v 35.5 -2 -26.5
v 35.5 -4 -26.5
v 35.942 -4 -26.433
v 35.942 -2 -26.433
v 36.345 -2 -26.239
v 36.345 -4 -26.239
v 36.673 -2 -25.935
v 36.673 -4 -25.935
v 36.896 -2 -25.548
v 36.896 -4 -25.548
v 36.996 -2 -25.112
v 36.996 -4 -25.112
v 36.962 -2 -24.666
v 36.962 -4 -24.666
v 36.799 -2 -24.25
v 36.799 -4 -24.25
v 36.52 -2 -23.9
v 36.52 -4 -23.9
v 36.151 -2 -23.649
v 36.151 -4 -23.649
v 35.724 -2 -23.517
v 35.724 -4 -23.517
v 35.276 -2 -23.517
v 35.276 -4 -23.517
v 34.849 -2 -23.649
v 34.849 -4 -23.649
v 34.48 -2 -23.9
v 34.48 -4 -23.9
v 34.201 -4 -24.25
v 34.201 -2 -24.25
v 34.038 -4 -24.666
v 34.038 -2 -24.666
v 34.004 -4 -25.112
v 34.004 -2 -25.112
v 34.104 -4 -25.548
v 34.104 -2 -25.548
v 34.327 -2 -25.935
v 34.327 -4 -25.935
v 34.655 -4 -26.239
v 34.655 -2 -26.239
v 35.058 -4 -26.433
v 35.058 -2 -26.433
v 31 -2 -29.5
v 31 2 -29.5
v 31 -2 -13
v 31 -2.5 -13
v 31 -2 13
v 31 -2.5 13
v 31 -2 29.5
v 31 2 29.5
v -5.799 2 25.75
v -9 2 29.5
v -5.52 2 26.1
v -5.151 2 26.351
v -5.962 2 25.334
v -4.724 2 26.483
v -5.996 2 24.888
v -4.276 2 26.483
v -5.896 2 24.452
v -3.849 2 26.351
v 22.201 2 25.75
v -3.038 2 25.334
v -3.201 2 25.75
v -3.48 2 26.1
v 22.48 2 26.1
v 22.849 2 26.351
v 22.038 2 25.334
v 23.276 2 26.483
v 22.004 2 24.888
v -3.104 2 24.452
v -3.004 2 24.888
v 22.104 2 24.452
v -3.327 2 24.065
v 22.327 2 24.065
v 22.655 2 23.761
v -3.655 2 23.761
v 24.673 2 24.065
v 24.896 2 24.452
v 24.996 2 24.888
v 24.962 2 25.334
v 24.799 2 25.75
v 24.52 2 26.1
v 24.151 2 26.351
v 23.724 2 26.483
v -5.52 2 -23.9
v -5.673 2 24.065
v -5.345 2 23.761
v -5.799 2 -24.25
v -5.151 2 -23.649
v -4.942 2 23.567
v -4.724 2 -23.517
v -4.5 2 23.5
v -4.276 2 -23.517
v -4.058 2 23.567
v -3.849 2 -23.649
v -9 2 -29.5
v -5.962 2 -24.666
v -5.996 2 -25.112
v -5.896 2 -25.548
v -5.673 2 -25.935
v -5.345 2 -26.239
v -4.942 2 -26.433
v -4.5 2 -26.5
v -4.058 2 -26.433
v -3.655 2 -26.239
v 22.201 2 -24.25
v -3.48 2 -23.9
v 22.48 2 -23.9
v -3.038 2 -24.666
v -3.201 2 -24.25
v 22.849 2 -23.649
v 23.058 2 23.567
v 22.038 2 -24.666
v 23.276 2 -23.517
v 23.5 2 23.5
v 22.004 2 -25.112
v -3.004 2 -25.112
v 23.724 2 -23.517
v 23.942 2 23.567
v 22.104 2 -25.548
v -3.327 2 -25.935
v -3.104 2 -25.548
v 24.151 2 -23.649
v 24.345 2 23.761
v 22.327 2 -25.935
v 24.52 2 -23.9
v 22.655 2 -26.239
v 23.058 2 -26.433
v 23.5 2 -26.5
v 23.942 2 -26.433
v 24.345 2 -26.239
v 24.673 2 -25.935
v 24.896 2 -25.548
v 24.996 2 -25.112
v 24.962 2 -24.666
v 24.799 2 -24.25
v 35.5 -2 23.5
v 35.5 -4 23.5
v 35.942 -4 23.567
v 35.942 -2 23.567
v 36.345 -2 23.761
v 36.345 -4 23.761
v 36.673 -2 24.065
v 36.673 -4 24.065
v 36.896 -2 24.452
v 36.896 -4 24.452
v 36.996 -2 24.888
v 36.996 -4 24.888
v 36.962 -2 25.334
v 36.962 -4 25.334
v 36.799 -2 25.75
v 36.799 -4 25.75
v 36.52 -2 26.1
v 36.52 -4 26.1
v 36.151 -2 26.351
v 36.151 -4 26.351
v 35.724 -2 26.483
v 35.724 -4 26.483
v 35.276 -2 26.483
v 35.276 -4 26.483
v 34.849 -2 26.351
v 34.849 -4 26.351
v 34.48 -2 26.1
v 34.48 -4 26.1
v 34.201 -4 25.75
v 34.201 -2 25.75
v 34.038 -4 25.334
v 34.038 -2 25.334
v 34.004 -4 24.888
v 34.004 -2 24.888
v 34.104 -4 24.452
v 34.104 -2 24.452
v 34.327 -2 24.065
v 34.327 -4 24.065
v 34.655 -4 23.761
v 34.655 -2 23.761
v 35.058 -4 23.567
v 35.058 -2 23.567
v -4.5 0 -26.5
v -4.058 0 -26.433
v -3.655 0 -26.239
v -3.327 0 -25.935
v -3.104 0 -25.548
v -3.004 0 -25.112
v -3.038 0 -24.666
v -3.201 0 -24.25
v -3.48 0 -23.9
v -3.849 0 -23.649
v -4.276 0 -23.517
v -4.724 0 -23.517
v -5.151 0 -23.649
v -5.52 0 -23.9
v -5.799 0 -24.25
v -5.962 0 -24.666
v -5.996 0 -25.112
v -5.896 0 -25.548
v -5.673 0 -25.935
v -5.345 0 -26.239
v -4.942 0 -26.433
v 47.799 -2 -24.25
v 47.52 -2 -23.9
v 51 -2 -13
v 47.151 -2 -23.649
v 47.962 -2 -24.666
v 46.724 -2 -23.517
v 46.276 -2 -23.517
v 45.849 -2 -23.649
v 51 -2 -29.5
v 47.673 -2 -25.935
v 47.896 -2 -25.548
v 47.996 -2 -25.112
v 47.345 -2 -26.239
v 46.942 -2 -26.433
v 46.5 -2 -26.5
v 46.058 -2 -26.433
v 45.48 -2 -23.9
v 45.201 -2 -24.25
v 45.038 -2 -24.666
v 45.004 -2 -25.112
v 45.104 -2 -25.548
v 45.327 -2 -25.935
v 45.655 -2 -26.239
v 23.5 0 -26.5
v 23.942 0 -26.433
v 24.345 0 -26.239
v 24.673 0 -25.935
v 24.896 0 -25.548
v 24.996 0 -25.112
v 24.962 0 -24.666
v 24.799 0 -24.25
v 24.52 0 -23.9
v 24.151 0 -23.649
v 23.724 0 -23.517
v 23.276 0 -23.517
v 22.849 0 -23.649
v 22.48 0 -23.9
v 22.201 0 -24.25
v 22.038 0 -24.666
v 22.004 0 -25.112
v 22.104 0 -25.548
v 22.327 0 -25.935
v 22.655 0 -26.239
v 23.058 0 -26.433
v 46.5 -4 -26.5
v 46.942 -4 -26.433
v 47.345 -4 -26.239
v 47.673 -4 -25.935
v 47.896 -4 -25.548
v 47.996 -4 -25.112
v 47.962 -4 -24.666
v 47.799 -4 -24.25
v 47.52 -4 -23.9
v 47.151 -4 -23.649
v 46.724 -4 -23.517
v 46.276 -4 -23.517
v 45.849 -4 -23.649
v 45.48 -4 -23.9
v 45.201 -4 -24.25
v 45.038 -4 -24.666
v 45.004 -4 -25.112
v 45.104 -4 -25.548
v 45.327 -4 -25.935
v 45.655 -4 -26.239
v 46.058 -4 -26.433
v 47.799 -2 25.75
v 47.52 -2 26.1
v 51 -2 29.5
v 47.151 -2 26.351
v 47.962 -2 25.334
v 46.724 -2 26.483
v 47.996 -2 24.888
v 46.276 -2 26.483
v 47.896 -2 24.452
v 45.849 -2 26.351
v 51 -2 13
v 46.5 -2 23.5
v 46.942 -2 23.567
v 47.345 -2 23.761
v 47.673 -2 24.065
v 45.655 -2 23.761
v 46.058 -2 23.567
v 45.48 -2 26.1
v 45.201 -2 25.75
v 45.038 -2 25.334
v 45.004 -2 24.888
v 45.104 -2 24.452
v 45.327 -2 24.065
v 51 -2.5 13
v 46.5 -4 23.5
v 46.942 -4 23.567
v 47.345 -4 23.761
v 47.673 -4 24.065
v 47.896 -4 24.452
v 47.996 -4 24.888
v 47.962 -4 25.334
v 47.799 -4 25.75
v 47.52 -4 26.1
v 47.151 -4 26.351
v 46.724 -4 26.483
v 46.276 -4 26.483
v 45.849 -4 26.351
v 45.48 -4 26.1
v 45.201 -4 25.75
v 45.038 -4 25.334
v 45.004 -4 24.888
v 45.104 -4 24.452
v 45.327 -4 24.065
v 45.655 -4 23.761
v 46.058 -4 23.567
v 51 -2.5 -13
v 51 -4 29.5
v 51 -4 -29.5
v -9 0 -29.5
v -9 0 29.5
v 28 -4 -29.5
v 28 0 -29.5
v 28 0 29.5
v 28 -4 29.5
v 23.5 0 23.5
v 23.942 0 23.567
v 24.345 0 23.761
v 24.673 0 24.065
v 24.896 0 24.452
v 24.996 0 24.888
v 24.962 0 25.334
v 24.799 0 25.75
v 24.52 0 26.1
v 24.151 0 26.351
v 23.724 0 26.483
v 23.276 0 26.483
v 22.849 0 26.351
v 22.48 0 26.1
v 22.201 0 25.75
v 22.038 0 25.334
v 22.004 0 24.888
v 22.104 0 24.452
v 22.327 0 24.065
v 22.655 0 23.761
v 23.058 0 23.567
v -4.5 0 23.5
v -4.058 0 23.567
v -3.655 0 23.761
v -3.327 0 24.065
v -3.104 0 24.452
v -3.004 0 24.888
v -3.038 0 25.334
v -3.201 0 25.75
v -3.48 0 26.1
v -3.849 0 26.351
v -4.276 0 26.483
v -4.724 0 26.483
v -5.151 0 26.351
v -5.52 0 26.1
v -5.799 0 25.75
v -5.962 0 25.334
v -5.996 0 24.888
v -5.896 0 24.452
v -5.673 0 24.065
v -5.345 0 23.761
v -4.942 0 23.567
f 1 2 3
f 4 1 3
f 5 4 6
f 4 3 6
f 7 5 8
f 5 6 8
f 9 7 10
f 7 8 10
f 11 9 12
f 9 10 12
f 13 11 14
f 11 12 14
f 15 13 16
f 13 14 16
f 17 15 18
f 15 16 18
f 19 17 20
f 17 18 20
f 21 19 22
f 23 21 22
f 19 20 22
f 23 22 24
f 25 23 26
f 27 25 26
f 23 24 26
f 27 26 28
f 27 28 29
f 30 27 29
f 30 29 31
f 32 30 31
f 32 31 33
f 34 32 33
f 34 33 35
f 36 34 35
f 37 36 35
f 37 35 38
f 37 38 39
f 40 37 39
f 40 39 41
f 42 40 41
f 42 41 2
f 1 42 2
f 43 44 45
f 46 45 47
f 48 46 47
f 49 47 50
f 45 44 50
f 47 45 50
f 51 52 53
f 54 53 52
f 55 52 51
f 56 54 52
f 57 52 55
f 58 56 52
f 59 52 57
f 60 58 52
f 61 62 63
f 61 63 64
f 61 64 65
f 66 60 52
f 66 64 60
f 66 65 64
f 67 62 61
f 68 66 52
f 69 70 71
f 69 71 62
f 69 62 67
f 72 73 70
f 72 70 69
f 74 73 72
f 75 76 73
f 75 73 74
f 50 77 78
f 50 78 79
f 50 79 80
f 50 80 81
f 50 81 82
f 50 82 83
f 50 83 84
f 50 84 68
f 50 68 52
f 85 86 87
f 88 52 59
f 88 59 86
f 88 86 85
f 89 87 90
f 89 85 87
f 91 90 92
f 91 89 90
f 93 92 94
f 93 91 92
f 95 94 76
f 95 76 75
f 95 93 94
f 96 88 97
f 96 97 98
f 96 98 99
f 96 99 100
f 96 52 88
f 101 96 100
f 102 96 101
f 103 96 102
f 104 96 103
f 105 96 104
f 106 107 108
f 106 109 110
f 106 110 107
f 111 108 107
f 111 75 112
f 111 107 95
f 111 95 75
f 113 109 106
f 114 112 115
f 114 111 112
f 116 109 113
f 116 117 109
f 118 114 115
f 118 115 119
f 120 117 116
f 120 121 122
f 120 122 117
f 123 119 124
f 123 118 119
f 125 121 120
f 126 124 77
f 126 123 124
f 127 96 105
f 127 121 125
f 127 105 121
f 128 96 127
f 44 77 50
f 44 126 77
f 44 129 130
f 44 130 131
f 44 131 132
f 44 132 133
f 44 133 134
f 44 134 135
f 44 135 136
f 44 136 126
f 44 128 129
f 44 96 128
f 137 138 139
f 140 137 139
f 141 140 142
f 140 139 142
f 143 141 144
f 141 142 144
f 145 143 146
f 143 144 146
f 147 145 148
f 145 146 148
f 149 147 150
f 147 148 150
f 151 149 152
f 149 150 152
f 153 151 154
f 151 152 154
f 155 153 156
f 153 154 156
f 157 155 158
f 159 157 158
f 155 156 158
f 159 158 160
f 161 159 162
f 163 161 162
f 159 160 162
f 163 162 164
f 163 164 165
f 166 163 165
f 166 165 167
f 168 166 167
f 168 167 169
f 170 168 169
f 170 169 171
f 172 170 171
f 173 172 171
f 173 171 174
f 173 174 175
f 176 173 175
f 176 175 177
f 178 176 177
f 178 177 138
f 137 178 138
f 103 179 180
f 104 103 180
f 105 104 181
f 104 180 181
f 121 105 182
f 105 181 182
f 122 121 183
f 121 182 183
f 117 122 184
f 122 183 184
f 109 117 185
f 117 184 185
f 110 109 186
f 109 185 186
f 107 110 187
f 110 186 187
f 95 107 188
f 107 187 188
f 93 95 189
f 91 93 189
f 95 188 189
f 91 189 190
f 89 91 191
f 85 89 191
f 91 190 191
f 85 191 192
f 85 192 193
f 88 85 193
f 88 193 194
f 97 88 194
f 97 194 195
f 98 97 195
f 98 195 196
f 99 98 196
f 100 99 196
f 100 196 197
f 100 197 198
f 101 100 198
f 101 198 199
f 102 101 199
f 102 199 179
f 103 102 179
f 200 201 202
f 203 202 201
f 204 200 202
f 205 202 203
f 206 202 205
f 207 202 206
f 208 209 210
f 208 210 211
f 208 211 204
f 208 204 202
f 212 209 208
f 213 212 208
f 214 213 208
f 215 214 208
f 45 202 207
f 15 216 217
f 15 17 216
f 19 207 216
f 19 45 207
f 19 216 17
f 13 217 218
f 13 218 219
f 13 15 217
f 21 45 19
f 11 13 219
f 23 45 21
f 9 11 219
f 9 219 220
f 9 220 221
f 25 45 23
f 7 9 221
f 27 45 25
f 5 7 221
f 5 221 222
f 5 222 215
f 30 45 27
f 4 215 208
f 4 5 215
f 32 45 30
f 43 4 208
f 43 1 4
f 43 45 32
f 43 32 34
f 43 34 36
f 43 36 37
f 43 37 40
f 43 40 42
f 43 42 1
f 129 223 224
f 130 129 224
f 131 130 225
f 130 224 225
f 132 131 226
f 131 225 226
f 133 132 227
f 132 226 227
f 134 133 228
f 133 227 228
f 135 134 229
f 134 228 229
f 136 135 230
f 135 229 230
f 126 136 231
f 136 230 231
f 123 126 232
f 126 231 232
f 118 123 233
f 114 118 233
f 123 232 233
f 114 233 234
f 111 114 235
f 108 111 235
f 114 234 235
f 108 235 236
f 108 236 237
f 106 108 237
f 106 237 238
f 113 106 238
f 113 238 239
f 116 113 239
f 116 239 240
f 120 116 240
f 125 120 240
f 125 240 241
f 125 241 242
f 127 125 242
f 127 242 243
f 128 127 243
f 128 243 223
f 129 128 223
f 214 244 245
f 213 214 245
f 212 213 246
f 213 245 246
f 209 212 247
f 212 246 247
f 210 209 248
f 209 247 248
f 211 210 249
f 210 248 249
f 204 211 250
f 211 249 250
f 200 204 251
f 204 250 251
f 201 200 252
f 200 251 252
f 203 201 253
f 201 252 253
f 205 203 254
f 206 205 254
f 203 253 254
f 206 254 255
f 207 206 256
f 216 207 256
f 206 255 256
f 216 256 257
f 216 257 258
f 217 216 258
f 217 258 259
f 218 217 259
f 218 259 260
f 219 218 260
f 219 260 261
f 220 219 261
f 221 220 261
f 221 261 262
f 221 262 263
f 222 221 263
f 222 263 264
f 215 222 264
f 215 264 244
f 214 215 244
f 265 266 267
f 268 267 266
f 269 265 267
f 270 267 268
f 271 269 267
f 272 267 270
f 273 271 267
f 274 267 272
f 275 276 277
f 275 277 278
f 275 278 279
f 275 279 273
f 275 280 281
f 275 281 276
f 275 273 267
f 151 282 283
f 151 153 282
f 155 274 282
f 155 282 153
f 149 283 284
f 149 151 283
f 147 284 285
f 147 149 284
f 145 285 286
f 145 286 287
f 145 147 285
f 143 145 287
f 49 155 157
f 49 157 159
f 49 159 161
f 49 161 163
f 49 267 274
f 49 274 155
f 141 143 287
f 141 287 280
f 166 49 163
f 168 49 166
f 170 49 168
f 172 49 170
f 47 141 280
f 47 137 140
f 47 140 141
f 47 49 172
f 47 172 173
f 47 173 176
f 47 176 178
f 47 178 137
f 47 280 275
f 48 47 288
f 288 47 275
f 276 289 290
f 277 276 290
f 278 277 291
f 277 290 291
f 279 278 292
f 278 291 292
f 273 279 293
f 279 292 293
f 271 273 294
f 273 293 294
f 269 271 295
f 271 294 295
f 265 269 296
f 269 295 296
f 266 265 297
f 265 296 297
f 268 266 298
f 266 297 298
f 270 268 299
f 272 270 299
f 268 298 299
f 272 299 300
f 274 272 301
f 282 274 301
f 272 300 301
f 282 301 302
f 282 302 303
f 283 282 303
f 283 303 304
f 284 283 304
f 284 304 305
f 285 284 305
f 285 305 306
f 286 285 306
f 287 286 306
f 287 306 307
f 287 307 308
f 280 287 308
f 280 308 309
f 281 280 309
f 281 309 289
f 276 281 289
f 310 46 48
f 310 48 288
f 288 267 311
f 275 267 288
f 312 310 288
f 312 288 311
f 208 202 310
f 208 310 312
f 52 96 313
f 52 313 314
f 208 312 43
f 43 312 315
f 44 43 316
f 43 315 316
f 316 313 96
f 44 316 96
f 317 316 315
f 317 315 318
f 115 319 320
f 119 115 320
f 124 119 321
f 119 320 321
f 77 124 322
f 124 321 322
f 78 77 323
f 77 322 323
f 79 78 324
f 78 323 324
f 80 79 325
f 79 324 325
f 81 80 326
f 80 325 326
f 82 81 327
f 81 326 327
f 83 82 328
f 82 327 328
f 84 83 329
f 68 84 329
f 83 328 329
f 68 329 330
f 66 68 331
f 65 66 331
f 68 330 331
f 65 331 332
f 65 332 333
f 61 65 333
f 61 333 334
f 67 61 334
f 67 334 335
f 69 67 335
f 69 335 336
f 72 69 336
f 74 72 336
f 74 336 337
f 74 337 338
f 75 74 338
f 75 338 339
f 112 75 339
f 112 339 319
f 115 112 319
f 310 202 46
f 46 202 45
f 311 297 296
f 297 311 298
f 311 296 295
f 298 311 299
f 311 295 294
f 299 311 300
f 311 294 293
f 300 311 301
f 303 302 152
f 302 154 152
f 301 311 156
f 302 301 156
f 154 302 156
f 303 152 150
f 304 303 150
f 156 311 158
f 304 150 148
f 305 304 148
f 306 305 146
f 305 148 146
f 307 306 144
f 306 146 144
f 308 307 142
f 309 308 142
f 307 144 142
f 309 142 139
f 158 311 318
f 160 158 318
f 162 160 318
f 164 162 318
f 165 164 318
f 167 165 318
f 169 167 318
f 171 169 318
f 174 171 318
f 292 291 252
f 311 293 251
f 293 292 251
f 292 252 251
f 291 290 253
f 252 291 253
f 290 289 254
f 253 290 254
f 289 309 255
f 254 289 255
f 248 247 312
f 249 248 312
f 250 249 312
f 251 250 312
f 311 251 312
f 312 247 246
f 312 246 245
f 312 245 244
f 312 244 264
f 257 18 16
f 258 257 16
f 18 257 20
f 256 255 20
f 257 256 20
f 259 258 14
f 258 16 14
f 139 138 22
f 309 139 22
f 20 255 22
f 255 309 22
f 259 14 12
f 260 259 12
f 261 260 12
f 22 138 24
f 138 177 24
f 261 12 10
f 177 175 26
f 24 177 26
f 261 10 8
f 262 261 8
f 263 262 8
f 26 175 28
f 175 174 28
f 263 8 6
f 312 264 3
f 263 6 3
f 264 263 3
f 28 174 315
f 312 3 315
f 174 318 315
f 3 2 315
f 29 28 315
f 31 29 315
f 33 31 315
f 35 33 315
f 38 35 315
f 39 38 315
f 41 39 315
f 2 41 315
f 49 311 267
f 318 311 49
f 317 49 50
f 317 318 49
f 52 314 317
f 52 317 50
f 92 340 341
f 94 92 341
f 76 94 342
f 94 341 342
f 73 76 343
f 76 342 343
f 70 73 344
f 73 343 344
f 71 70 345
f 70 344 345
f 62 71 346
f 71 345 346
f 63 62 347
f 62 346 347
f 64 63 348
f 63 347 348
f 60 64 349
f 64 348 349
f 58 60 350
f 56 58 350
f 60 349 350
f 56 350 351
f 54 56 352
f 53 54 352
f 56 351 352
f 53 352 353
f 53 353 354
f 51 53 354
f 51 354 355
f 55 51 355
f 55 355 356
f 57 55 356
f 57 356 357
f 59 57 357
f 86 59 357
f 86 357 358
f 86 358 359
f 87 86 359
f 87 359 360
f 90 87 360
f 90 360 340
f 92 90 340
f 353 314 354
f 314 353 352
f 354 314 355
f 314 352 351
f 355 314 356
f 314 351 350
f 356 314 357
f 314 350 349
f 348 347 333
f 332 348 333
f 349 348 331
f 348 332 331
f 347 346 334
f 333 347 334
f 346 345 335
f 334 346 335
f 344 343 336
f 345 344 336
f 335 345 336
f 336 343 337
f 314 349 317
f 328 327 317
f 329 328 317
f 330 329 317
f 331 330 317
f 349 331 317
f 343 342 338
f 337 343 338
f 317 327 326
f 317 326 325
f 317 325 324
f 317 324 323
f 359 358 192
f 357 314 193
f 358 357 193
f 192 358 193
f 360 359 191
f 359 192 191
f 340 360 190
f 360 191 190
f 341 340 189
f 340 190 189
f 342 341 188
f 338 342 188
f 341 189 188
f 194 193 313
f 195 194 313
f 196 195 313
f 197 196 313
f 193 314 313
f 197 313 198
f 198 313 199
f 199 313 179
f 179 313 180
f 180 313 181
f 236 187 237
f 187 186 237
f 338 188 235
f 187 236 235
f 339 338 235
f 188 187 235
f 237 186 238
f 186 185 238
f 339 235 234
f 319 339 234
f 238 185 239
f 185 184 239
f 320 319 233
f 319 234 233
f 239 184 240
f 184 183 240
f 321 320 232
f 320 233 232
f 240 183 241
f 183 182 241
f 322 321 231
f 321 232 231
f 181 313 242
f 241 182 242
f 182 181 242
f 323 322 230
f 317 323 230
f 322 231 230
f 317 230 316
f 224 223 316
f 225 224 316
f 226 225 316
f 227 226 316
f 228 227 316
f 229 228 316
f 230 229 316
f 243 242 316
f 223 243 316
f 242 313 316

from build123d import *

# Parameters (mm, degrees)
SKETCH_1_W          = 62
SKETCH_1_H          = 59
EXTRUDE_1_DEPTH     = 2
SKETCH_2_W          = 3
SKETCH_2_H          = 59
EXTRUDE_2_DEPTH     = 4
SKETCH_3_W          = 59
SKETCH_3_H          = 2
EXTRUDE_3_DEPTH     = 20
HOLE_WIZARD_M3_2_D  = 3
HOLE_WIZARD_M3_1_D  = 3
SKETCH_6_R          = 1.5
CUT_EXTRUDE_3_DEPTH = 10
SKETCH_7_W          = 59
SKETCH_7_H          = 2
CUT_EXTRUDE_4_DEPTH = 22
HOLE_WIZARD_M3_3_D  = 3
CUT_EXTRUDE_6_DEPTH = 0.5


with BuildPart() as part:
    # 草图1 → 凸台-拉伸1 (new body)
    with BuildSketch(Plane(origin=(0, 0, 0), x_dir=(1, 0, 0), z_dir=(0, 1, 0))):
        Rectangle(SKETCH_1_W, SKETCH_1_H)
    extrude(amount=EXTRUDE_1_DEPTH)

    # 草图2 → 凸台-拉伸2 (add)
    with BuildSketch(Plane.XZ):
        with Locations((29.5, 0)):
            Rectangle(SKETCH_2_W, SKETCH_2_H)
    extrude(amount=EXTRUDE_2_DEPTH)

    # 草图3 → 凸台-拉伸3 (add)
    with BuildSketch(Plane(origin=(31, 0, 0), x_dir=(0, 0, -1), z_dir=(1, 0, 0))):
        with Locations((0, -3)):
            Rectangle(SKETCH_3_W, SKETCH_3_H)
    extrude(amount=EXTRUDE_3_DEPTH)

    # M3 螺纹孔2 (through all)
    with Locations(Plane(origin=(23.5, 2, -25), x_dir=(0, 0, 1), z_dir=(0, 1, 0))):
        with Locations((0, 0), (50, 0)):
            Hole(HOLE_WIZARD_M3_2_D / 2)

    # M3 螺纹孔1 (through all)
    with Locations(Plane(origin=(35.5, -2, -25), x_dir=(0, 0, 1), z_dir=(0, 1, 0))):
        with Locations((0, 0), (0, 11), (50, 0), (50, 11)):
            Hole(HOLE_WIZARD_M3_1_D / 2)

    # 草图6 → 切除-拉伸3 (cut)
    with BuildSketch(Plane(origin=(0, 2, 0), x_dir=(1, 0, 0), z_dir=(0, 1, 0))):
        with Locations((-26.5, 25)):
            Circle(SKETCH_6_R)
        with Locations((-26.5, -25)):
            Circle(SKETCH_6_R)
    extrude(amount=-CUT_EXTRUDE_3_DEPTH, mode=Mode.SUBTRACT)

    # 草图7 → 切除-拉伸4 (cut)
    with BuildSketch(Plane.ZY.offset(31)):
        with Locations((0, 1)):
            Rectangle(SKETCH_7_W, SKETCH_7_H)
    extrude(amount=-CUT_EXTRUDE_4_DEPTH, mode=Mode.SUBTRACT)

    # M3 螺纹孔3 (through all)
    with Locations(Plane(origin=(-4.5, 2, -25), x_dir=(0, 0, 1), z_dir=(0, 1, 0))):
        with Locations((0, 0), (50, 0)):
            Hole(HOLE_WIZARD_M3_3_D / 2)

    # 草图9 → 切除-拉伸6 (cut)
    with BuildSketch(Plane(origin=(0, -2, 0), x_dir=(1, 0, 0), z_dir=(0, 1, 0))):
        Polygon((51, -13), (51, 0), (51, 13), (31, 13), (31, -13), align=None)
    extrude(amount=-CUT_EXTRUDE_6_DEPTH, mode=Mode.SUBTRACT)


solid = part.part
